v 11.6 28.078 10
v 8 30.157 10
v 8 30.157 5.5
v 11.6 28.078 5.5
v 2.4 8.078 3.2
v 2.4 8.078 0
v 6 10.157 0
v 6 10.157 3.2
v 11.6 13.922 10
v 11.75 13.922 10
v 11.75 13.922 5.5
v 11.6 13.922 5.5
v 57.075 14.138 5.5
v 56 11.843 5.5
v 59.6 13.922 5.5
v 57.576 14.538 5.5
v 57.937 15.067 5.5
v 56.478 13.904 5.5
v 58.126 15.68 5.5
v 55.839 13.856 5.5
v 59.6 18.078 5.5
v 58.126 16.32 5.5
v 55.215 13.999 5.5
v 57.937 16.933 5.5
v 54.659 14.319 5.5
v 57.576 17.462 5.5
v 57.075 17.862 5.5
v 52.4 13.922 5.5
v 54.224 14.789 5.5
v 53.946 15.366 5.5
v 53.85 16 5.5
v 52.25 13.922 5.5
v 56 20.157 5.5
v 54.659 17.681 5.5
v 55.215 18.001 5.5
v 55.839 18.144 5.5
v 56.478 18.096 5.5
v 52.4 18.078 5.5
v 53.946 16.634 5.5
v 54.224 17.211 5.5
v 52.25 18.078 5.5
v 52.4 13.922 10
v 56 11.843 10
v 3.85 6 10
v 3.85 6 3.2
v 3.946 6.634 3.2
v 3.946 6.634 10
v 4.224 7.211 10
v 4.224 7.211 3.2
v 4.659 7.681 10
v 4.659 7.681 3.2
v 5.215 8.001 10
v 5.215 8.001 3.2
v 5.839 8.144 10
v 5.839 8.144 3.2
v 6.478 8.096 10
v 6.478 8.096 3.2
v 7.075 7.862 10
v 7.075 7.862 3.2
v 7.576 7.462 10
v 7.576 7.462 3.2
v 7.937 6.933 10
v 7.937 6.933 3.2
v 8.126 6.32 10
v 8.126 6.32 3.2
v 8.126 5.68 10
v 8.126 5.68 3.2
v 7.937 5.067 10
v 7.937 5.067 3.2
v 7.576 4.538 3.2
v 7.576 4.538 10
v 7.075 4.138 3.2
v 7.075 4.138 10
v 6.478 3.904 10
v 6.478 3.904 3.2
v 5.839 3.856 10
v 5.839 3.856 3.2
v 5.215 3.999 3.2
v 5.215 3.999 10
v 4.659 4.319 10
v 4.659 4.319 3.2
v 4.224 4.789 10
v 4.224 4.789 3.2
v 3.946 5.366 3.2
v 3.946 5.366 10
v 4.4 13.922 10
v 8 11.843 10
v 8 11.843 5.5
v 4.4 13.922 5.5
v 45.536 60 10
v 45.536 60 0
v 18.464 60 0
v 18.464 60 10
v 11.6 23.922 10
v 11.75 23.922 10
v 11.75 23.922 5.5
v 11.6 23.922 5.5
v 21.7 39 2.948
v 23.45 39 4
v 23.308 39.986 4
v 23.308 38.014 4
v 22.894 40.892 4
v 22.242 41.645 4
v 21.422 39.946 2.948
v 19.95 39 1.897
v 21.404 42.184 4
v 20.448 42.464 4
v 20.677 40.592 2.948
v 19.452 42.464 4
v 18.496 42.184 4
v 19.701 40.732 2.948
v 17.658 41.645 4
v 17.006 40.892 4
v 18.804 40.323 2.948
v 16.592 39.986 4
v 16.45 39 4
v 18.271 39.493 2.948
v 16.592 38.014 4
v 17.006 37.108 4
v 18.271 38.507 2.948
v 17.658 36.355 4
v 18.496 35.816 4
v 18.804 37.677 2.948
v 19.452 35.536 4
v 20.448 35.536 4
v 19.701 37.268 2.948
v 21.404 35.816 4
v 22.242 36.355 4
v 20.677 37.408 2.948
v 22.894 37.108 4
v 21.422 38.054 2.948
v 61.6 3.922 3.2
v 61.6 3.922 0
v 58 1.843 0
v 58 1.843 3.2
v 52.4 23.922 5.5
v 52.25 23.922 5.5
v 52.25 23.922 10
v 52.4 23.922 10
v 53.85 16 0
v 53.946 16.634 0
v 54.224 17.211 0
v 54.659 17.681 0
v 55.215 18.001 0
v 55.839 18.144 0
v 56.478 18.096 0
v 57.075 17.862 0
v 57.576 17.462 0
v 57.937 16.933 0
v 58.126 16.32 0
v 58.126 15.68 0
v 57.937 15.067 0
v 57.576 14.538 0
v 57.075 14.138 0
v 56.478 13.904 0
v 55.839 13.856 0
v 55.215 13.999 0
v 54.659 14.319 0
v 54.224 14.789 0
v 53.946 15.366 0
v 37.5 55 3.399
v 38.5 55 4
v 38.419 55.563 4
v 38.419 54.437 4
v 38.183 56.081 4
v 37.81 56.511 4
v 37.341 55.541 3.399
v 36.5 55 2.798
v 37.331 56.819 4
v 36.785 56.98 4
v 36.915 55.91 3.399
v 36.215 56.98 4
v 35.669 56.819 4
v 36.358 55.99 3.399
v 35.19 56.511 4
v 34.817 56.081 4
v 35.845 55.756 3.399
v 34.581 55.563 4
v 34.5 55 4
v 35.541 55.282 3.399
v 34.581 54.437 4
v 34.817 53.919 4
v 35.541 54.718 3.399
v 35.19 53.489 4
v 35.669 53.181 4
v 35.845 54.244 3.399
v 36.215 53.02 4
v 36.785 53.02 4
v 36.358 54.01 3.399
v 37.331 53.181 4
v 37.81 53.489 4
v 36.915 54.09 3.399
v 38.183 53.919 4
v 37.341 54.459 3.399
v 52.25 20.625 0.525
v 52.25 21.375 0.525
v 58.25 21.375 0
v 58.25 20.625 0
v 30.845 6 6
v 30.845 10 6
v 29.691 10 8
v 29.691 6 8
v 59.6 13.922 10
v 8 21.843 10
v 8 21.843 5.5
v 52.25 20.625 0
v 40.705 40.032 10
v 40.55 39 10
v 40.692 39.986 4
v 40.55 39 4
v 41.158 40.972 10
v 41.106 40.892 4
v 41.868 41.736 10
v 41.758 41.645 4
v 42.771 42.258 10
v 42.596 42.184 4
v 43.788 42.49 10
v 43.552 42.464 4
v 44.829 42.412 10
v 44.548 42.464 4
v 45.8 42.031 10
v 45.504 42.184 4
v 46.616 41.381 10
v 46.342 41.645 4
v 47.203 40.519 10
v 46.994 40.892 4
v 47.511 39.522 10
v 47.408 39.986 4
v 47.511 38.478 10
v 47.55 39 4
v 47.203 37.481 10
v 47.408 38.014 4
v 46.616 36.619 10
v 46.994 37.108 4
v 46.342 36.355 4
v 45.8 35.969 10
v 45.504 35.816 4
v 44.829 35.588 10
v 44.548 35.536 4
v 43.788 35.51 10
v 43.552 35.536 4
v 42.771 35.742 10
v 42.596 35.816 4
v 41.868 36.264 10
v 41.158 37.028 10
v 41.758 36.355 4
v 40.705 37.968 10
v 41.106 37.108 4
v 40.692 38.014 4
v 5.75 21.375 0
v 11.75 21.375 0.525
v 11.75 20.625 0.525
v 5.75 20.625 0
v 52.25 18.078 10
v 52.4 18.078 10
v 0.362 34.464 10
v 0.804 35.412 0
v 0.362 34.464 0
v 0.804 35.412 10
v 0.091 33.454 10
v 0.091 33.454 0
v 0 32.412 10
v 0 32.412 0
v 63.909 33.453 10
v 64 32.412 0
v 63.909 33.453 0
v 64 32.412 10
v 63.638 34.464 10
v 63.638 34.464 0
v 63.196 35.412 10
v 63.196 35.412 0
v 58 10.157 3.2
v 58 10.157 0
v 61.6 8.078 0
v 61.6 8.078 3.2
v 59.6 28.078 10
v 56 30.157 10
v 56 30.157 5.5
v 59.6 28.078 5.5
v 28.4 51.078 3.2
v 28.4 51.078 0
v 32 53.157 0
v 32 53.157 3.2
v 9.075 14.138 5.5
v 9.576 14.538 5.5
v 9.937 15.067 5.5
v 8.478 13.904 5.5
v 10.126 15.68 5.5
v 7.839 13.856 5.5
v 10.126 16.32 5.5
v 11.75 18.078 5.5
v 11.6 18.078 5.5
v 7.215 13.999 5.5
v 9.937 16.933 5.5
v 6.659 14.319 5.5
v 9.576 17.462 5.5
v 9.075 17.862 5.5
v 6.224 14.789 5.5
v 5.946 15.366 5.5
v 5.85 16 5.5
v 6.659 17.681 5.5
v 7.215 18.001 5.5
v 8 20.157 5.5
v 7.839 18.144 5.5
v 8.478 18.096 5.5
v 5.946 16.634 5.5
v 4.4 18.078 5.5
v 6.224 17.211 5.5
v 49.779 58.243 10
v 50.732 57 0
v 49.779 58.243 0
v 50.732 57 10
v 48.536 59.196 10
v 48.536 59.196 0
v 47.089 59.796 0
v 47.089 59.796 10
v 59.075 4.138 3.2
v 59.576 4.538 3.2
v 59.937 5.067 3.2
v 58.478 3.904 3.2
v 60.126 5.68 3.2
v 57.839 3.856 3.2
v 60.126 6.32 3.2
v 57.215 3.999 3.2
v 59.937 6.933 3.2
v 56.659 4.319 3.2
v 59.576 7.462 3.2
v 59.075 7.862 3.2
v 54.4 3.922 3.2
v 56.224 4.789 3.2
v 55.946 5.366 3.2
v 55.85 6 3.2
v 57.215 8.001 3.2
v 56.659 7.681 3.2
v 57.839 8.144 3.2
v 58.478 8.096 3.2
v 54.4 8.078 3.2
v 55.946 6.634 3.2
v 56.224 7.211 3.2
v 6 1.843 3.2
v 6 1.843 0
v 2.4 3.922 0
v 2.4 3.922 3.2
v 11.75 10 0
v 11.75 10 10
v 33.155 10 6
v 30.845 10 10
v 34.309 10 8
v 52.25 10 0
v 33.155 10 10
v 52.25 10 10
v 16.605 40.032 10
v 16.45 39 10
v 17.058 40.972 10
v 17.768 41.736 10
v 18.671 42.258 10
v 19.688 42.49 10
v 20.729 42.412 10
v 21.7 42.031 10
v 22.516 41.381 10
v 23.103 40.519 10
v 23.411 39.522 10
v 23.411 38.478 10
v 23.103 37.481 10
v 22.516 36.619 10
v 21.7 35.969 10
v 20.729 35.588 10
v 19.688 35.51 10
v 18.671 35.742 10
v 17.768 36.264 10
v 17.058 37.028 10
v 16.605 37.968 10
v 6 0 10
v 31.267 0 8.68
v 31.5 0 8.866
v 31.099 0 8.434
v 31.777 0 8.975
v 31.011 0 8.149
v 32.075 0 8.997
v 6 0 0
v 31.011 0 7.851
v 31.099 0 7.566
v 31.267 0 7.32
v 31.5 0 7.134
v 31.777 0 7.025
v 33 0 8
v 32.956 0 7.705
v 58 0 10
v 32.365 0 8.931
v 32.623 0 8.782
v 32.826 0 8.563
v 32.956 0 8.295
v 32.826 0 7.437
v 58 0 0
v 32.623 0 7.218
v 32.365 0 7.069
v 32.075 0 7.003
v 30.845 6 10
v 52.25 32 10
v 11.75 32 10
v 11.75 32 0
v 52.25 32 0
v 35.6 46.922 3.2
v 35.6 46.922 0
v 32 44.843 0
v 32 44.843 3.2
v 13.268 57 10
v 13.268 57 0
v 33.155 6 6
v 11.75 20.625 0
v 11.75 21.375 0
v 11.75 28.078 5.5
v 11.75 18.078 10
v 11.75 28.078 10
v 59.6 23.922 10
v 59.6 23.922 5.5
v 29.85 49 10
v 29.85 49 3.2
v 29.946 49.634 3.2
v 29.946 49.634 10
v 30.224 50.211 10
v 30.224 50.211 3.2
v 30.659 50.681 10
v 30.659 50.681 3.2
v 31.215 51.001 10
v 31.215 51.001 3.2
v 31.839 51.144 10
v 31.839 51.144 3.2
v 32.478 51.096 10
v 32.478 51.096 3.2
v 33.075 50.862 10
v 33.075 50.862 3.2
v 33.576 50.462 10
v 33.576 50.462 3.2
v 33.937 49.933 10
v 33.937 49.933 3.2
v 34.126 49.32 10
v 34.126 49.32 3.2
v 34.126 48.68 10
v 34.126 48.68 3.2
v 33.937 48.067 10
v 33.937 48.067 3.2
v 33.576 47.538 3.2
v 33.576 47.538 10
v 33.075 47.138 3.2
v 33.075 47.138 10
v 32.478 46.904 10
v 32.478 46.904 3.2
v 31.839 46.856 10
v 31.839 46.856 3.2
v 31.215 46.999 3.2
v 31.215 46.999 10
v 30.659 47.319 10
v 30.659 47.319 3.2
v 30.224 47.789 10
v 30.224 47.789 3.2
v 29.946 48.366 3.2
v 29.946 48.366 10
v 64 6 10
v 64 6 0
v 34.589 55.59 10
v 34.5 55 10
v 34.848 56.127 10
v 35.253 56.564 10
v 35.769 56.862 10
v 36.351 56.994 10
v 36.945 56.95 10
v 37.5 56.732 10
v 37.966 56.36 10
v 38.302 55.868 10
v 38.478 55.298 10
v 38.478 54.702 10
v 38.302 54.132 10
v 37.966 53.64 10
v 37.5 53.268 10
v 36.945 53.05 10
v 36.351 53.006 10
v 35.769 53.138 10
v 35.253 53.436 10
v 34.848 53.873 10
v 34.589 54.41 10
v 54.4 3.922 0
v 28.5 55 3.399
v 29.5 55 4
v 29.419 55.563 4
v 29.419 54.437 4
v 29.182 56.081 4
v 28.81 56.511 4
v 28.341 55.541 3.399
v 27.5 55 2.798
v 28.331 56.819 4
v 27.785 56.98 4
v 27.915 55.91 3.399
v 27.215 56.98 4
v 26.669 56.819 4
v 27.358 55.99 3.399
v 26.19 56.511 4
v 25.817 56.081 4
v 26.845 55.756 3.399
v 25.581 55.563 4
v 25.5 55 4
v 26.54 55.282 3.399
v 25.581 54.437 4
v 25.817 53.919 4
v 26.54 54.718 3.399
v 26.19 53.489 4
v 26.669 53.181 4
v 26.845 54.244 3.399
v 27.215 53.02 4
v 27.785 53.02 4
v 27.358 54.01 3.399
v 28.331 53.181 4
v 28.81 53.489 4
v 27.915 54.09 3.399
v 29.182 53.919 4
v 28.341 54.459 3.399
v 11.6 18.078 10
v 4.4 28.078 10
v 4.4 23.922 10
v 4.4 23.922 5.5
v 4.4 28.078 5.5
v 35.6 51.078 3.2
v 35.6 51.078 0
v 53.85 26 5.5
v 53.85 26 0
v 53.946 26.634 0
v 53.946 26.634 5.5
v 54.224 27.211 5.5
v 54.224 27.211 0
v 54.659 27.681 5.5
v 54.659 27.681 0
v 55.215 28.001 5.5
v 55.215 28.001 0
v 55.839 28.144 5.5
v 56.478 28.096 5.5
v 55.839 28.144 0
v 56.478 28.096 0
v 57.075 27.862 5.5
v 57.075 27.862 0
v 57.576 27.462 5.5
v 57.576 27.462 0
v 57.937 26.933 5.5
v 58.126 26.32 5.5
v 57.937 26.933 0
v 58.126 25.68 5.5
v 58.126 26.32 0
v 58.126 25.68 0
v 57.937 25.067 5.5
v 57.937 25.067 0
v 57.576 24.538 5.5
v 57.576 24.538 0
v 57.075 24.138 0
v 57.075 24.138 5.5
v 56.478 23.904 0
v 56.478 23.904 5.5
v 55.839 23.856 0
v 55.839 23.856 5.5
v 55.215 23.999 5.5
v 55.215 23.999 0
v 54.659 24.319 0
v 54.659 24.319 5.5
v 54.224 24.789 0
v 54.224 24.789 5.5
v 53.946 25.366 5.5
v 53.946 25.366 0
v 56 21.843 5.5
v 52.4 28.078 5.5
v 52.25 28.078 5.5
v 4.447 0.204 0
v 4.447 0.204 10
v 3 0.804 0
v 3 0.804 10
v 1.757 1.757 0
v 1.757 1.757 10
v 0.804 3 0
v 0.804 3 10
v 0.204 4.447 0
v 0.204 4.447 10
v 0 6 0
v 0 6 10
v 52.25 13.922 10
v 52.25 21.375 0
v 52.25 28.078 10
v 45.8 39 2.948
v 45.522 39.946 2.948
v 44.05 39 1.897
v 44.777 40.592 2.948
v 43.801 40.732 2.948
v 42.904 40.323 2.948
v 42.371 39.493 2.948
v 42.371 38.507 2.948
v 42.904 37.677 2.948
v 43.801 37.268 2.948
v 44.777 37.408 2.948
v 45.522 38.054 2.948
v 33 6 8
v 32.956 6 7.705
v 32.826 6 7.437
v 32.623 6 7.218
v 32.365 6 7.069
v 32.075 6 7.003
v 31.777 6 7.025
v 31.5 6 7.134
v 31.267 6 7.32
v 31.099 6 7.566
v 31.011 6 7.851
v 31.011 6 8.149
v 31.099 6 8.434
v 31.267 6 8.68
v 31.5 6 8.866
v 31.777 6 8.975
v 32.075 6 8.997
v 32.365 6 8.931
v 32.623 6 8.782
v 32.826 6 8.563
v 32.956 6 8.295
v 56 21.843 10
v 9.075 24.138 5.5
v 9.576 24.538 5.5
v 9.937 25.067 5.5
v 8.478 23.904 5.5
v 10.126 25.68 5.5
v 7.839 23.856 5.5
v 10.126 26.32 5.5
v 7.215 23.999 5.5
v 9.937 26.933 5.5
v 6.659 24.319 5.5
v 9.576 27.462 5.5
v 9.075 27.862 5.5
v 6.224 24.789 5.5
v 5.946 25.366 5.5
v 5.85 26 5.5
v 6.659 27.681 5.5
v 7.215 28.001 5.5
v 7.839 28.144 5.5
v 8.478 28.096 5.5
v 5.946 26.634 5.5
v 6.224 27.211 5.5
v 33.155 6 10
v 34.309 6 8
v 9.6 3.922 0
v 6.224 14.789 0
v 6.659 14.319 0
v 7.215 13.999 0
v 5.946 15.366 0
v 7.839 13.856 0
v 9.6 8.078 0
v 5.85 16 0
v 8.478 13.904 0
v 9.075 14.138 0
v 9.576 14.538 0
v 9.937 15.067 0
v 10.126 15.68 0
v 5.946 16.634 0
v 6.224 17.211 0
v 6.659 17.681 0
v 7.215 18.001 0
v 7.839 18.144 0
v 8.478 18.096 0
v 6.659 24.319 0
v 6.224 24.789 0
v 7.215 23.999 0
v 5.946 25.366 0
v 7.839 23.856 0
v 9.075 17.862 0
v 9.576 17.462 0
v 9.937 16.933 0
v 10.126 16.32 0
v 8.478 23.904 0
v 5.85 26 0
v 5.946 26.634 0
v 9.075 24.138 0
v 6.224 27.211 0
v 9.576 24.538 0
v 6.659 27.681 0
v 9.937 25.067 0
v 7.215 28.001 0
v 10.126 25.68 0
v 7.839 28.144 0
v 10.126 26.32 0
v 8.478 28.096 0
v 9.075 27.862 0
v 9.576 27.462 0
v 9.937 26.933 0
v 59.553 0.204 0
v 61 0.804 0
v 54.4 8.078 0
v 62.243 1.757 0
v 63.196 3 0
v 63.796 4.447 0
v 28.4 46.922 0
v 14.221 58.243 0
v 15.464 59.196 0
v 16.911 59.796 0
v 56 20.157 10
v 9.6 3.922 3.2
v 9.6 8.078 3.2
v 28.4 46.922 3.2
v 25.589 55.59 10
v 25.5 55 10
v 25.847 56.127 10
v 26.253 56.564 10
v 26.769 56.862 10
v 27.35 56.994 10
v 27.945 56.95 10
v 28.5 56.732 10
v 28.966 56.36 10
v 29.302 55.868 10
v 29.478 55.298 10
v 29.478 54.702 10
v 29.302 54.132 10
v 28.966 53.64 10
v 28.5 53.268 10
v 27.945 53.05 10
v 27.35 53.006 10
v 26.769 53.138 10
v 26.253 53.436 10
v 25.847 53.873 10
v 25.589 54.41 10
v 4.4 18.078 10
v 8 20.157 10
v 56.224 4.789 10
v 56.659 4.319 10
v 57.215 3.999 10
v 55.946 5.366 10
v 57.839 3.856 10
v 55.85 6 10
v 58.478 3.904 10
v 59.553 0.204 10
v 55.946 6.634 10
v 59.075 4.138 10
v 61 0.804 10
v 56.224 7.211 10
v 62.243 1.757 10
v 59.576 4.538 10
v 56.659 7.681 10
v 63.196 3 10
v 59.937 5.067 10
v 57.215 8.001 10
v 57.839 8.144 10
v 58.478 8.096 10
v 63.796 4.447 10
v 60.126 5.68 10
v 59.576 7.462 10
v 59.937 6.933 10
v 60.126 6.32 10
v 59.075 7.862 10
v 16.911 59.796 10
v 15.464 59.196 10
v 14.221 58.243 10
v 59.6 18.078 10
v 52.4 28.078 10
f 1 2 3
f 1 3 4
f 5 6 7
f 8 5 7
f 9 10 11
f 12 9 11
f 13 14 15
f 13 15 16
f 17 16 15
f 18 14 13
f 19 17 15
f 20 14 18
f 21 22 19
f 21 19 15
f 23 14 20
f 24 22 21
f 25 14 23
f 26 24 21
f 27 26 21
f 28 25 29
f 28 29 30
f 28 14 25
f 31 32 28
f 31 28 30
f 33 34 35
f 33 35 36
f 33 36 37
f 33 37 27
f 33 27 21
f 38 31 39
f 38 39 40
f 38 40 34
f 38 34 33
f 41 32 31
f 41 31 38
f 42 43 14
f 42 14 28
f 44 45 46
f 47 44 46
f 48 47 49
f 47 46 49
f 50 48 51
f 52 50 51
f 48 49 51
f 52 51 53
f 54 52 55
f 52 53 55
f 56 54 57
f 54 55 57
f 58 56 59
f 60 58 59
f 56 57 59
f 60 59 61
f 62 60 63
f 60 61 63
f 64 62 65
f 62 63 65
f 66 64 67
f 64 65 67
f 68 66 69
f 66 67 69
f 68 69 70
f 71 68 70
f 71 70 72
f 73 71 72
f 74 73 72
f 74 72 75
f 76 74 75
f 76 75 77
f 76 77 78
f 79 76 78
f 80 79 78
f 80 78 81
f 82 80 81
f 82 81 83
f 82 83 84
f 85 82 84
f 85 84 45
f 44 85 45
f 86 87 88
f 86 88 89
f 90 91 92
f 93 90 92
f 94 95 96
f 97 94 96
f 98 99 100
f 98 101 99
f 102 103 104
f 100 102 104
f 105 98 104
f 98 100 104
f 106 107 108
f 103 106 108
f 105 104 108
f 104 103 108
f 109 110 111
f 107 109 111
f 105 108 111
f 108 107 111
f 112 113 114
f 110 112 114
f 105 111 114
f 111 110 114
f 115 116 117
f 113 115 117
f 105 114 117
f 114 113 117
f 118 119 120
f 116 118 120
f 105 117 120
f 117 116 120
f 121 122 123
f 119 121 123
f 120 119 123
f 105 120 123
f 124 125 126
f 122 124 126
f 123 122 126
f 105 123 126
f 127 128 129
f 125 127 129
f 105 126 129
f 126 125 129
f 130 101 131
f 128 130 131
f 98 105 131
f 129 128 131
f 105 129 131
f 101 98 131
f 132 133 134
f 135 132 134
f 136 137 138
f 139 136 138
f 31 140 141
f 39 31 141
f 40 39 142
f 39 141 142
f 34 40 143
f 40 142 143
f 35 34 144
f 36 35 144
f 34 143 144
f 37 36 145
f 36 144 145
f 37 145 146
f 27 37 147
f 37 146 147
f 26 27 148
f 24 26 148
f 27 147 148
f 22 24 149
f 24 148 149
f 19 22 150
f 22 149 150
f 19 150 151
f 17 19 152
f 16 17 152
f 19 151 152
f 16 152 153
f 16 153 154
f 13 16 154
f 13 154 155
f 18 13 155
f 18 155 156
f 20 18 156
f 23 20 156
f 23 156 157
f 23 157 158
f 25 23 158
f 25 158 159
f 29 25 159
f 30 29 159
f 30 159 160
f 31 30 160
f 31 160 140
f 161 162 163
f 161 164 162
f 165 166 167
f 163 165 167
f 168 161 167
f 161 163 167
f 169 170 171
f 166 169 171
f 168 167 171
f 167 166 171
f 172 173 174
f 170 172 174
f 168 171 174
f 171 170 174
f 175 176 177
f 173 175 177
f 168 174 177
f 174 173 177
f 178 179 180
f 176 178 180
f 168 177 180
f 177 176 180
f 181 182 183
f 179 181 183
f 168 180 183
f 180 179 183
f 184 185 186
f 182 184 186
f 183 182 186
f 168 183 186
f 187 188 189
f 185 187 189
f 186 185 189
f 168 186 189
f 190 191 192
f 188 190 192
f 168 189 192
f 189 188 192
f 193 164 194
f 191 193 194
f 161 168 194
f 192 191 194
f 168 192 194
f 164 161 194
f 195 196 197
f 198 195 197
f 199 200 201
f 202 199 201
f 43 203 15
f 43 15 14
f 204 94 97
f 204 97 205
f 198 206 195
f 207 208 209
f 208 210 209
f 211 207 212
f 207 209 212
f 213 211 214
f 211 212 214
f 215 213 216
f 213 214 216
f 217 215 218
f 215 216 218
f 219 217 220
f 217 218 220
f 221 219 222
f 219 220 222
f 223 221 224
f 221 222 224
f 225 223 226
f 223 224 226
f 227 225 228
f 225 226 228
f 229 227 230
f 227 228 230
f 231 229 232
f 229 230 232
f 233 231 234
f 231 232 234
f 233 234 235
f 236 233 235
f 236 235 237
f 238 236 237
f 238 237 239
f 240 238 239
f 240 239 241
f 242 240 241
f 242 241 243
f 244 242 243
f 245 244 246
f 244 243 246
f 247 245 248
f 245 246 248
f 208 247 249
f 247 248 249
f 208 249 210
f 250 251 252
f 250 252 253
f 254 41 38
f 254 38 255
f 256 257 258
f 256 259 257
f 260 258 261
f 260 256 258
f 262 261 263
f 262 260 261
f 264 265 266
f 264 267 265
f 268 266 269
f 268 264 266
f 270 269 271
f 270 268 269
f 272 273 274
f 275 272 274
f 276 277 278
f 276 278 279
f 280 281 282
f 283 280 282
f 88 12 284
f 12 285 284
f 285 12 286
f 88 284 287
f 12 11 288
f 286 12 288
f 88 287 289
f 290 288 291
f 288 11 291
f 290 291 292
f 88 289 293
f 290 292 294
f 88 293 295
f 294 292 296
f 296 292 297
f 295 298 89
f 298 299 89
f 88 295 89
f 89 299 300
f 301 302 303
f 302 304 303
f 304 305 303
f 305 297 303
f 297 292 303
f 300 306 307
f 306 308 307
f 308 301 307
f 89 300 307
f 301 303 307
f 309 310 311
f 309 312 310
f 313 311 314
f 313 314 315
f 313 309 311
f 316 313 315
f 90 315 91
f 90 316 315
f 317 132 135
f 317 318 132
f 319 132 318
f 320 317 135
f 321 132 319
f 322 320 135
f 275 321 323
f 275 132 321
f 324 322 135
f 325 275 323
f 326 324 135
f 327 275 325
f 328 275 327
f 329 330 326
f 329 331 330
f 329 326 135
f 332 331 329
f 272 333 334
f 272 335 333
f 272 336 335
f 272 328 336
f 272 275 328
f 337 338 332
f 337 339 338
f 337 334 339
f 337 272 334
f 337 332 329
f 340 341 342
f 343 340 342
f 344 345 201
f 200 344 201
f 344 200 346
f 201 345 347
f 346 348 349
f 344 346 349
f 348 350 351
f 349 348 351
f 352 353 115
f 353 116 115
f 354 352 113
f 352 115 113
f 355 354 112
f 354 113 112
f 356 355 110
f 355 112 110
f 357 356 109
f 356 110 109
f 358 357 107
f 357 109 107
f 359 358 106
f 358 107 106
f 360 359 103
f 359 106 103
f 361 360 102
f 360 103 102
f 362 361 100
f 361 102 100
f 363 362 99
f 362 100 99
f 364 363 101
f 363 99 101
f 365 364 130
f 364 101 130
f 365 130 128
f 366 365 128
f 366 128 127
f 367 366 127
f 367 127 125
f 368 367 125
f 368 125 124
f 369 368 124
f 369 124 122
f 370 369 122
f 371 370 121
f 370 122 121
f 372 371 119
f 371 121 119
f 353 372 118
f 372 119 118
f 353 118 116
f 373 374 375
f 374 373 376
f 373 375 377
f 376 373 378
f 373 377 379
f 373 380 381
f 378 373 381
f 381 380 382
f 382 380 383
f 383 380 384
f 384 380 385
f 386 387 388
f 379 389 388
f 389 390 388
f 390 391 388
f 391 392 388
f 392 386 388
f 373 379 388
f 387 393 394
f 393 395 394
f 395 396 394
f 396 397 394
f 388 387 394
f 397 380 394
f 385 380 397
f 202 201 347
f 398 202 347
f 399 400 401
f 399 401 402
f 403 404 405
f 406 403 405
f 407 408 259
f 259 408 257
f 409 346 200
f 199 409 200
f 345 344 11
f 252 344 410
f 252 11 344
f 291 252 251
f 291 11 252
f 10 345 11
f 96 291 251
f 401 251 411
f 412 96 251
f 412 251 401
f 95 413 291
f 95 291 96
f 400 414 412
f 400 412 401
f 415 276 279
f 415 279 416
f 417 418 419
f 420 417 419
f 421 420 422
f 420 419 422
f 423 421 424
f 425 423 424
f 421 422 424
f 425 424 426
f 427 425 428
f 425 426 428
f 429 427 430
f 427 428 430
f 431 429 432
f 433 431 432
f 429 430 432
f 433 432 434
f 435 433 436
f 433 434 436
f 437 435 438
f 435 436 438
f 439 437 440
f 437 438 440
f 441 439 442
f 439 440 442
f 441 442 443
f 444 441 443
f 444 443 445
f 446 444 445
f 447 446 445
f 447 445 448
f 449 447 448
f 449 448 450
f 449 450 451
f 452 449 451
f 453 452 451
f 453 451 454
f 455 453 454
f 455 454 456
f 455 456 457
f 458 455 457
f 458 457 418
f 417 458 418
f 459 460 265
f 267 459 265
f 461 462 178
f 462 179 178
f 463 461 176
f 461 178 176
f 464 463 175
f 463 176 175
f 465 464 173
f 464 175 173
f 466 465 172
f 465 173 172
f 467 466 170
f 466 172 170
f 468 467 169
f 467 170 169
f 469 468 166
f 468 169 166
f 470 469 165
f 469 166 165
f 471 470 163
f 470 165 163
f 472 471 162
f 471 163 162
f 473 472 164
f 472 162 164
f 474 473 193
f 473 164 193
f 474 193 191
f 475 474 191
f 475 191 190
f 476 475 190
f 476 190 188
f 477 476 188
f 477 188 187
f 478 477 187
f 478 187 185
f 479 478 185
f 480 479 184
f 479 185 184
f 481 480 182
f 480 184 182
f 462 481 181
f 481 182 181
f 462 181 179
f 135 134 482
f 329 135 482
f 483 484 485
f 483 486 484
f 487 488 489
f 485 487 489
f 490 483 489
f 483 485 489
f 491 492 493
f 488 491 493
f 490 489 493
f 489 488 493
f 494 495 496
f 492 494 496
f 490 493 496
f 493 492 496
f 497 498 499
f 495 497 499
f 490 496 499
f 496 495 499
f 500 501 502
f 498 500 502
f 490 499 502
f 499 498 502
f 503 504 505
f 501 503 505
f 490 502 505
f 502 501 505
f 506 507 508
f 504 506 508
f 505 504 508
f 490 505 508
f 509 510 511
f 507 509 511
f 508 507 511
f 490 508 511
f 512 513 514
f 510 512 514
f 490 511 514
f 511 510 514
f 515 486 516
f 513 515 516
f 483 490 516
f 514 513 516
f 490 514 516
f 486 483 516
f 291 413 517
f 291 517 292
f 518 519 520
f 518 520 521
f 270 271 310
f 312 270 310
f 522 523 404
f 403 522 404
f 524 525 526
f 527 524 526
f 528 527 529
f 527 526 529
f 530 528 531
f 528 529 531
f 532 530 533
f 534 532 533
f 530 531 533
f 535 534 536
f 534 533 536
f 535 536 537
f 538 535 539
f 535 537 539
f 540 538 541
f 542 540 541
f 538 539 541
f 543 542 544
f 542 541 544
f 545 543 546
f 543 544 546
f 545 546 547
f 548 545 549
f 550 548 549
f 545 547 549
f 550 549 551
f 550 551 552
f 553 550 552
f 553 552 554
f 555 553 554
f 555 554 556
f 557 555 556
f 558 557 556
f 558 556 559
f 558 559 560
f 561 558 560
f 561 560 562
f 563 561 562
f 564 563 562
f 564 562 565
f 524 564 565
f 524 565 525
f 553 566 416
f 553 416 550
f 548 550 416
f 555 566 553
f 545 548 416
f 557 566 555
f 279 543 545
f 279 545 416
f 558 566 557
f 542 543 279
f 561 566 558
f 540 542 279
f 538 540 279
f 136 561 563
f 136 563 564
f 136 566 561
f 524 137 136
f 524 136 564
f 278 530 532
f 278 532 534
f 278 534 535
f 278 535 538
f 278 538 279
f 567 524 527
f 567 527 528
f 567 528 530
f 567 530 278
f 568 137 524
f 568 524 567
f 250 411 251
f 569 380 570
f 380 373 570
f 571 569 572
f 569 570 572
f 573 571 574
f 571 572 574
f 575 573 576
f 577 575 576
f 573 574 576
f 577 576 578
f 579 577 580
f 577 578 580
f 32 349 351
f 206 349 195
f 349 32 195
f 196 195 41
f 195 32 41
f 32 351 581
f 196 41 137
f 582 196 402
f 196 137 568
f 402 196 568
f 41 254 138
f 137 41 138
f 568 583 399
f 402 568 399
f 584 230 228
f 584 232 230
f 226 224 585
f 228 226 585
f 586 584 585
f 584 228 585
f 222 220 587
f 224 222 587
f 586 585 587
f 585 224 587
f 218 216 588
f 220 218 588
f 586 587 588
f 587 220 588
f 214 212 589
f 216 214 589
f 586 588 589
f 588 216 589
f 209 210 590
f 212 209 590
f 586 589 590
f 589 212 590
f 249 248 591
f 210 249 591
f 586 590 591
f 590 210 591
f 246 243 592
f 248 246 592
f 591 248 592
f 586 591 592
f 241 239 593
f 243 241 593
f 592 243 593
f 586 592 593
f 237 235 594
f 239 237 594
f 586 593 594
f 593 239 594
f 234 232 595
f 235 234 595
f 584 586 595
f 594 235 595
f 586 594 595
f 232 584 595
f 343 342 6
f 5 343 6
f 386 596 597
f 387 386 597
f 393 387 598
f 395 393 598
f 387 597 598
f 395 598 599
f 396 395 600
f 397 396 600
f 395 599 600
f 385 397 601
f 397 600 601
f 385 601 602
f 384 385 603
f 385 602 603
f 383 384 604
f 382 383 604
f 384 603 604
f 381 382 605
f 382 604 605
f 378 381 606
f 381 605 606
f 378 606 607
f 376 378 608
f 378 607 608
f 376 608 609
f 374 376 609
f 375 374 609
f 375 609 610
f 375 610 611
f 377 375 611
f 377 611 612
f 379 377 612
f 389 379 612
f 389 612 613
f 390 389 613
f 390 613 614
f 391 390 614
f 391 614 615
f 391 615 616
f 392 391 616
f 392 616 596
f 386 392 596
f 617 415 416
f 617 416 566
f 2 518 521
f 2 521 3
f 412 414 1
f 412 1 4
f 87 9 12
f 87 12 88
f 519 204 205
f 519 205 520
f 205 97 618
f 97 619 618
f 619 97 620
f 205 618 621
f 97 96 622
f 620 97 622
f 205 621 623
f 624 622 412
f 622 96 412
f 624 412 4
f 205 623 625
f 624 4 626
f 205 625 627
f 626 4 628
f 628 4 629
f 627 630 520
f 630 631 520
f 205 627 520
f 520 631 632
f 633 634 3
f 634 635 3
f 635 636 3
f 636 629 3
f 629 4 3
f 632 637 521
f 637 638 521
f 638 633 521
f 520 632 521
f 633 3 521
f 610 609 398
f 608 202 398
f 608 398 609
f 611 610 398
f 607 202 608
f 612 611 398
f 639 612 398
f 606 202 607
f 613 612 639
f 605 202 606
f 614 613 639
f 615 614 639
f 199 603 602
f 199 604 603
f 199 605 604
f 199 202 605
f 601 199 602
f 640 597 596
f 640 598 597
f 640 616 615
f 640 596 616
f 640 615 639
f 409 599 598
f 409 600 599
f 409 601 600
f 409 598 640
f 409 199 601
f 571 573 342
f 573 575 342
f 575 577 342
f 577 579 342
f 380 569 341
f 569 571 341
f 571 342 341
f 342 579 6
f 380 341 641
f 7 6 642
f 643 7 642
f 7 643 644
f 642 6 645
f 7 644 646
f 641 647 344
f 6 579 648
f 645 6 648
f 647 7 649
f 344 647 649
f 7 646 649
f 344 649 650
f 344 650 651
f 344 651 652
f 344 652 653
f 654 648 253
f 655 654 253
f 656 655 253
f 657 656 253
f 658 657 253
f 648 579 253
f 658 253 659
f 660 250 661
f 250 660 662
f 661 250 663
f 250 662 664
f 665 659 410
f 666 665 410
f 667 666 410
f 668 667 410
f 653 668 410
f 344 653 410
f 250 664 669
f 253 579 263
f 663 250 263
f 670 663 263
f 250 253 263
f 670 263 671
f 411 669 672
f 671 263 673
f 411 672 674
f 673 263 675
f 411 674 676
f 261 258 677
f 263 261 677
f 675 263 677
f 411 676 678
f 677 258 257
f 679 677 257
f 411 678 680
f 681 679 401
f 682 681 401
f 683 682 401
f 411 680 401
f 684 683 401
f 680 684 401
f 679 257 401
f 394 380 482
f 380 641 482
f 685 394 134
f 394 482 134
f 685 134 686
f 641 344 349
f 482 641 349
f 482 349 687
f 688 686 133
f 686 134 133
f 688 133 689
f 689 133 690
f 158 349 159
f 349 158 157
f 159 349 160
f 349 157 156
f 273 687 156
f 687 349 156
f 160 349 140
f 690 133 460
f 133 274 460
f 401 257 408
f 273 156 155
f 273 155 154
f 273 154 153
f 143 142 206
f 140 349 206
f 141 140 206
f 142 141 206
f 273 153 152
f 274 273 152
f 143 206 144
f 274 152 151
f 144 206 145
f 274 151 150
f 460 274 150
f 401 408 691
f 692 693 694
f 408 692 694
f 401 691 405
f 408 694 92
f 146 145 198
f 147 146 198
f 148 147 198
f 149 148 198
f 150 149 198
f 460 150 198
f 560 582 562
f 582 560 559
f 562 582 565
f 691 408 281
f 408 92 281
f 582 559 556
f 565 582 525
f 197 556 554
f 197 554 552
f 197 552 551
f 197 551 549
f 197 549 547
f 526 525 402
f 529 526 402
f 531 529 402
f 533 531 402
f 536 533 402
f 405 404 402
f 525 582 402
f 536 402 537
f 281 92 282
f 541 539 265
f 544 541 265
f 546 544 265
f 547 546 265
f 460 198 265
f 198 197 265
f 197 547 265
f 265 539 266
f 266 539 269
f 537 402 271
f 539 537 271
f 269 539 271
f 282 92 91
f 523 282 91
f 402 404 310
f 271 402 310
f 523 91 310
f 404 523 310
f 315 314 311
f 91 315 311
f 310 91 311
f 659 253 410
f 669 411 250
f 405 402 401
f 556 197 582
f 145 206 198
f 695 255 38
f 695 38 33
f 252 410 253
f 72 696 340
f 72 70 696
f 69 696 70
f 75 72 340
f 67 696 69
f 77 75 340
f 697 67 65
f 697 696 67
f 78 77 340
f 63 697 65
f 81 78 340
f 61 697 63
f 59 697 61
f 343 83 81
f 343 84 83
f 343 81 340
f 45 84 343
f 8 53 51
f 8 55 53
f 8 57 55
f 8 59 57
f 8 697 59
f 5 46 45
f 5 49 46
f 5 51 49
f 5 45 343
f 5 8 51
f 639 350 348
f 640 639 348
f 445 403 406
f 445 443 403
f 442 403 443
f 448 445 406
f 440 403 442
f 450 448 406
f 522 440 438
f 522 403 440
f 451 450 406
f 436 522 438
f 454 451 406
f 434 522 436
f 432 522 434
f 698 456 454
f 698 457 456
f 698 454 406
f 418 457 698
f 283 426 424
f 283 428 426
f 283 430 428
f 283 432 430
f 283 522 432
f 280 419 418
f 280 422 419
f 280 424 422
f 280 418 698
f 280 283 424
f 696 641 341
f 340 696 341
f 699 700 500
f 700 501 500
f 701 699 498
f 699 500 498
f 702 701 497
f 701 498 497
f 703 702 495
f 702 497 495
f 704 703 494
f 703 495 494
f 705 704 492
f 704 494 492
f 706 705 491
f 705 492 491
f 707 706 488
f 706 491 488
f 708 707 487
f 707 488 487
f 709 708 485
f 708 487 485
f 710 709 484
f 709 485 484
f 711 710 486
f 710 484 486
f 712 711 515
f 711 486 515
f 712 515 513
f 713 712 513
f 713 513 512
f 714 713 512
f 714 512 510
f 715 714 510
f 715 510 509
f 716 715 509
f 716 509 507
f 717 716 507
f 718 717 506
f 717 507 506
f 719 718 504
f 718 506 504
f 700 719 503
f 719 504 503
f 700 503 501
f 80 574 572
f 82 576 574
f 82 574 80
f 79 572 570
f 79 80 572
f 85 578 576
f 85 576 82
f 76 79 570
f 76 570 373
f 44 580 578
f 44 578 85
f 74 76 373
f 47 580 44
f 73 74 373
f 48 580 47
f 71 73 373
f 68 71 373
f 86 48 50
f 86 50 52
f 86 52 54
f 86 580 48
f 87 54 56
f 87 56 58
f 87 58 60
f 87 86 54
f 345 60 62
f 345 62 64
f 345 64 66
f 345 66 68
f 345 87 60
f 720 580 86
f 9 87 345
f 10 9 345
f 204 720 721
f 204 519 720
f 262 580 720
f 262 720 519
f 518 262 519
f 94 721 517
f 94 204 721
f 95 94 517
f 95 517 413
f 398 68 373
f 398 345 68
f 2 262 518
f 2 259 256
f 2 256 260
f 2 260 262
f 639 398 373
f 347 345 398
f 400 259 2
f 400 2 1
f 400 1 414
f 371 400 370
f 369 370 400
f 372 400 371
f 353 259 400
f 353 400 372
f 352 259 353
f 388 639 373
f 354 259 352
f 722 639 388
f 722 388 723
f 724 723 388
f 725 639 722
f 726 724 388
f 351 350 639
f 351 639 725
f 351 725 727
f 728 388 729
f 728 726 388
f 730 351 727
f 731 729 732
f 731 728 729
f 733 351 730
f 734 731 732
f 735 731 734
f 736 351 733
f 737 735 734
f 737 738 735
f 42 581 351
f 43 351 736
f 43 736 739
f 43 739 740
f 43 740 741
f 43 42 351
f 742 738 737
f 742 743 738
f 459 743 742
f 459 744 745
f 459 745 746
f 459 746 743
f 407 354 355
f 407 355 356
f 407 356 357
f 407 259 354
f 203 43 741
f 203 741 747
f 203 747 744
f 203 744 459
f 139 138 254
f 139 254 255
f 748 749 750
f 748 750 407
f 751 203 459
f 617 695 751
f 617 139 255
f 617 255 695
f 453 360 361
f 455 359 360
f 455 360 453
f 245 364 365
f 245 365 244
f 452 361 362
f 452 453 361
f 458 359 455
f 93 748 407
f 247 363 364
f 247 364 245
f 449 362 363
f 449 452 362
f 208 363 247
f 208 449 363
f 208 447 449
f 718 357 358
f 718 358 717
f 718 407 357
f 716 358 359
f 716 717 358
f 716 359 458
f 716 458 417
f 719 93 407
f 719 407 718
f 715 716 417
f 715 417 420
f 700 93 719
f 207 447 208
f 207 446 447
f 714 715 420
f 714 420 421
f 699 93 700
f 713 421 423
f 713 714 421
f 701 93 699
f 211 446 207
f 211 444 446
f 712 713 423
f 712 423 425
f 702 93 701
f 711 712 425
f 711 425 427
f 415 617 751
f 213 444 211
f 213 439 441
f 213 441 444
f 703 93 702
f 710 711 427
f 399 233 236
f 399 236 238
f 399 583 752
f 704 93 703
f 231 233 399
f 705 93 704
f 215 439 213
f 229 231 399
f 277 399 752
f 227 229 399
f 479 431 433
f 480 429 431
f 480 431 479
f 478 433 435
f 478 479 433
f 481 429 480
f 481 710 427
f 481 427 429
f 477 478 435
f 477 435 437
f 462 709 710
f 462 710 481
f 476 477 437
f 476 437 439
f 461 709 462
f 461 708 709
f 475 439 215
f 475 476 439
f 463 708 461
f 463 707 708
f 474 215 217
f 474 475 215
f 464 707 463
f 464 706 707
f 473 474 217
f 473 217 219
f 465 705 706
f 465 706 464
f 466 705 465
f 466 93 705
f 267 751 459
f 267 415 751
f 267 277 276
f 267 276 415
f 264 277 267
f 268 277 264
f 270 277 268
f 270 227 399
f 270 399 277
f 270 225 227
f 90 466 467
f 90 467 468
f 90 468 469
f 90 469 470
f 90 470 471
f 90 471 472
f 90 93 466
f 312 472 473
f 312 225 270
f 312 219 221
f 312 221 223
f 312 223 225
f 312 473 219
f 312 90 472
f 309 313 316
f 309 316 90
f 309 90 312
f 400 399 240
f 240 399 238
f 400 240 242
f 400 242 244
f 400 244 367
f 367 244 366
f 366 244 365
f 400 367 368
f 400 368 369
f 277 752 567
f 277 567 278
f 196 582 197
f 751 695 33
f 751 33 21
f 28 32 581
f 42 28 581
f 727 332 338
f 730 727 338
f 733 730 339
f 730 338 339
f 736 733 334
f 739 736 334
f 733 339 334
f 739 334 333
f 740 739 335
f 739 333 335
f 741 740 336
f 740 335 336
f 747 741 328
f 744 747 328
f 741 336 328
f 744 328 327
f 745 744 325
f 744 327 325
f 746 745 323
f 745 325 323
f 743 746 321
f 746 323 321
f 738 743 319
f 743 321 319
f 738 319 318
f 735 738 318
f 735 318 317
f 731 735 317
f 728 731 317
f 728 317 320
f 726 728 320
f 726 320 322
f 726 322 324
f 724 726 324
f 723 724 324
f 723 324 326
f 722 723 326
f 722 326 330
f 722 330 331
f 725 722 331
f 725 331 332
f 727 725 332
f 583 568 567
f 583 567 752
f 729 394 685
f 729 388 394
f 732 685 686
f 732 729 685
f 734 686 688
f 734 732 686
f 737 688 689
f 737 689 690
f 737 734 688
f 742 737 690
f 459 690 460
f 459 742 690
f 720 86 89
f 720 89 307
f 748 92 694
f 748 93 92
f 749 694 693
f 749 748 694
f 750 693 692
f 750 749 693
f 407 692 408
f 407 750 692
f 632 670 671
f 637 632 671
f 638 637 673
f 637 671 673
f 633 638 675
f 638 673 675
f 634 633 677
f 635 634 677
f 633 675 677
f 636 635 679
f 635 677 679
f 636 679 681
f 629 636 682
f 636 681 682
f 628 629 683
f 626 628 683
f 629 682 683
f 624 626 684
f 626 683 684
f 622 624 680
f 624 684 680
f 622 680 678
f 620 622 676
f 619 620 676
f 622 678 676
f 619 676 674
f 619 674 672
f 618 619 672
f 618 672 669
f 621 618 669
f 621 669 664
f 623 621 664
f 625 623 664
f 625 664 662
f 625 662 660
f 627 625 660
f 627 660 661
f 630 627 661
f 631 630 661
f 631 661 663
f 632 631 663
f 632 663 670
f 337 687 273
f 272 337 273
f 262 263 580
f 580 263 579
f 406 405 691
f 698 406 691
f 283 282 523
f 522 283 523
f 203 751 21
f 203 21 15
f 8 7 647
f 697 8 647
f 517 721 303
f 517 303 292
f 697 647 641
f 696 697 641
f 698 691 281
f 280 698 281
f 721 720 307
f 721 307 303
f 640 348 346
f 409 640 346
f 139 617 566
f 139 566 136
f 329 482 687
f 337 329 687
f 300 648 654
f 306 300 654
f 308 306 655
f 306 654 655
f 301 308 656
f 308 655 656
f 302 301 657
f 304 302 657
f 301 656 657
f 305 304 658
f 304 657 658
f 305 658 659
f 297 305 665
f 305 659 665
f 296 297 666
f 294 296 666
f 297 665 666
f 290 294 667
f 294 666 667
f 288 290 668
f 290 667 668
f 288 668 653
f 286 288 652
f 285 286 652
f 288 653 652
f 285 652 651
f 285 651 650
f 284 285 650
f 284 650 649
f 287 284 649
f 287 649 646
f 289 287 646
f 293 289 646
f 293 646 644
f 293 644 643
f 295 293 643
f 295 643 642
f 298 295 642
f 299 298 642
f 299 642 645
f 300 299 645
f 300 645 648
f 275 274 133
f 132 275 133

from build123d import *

# Parameters (mm, degrees)
EXTRUDE_1_DEPTH           = 10
FILLET_1_R                = 6
SKETCH_2_W                = 40.5
SKETCH_2_H                = 22
CUT_EXTRUDE_1_DEPTH       = 11
HOLE_WIZARD_4_0_1_D       = 4
HOLE_WIZARD_4_0_1_DEPTH   = 6
HOLE_WIZARD_4_0_1_TIP     = 1.201721238
HOLE_WIZARD_7_0_7_1_D     = 7
HOLE_WIZARD_7_0_7_1_DEPTH = 6
HOLE_WIZARD_7_0_7_1_TIP   = 2.103012167
HOLE_WIZARD_M41_D         = 4.3
CUT_EXTRUDE_4_DEPTH       = 4.5
HOLE_WIZARD_M42_D         = 4.3
CUT_EXTRUDE_7_DEPTH       = 3.2
SKETCH_19_W               = 4.5
SKETCH_19_H               = 4.156921938
CUT_EXTRUDE_13_DEPTH      = 0.15
SKETCH_21_W               = 4.5
SKETCH_21_H               = 4.156921938
CUT_EXTRUDE_14_DEPTH      = 0.15
SKETCH_22_W               = 4.5
SKETCH_22_H               = 4.156921938
CUT_EXTRUDE_15_DEPTH      = 0.15
SKETCH_23_W               = 4.5
SKETCH_23_H               = 4.156921938
CUT_EXTRUDE_16_DEPTH      = 0.15
CUT_EXTRUDE_17_DEPTH      = 4
HOLE_WIZARD_M2_21_D       = 2
HOLE_WIZARD_M2_21_DEPTH   = 10
HOLE_WIZARD_M2_21_TIP     = 0.600860619
CUT_EXTRUDE_19_DEPTH      = 0.375
CUT_EXTRUDE_20_DEPTH      = 0.375


with BuildPart() as part:
    # Эскиз1 → Бобышка-Вытянуть1 (new body)
    with BuildSketch(Plane.XY):
        Polygon((0, 0), (64, 0), (64, 34.019237886), (49, 60), (15, 60), (0, 34.02), align=None)
    extrude(amount=EXTRUDE_1_DEPTH)

    # Скругление1
    fillet_1_edges = [part.edges().sort_by_distance(p)[0] for p in [
        (0, 34.02, 5),
        (15, 60, 5),
        (49, 60, 5),
        (64, 34.019237886, 5),
        (64, 0, 5),
        (0, 0, 5),
    ]]
    fillet(fillet_1_edges, radius=FILLET_1_R)

    # Эскиз2 → Вырез-Вытянуть1 (cut, through all)
    with BuildSketch(Plane.XY.offset(10)):
        with Locations((32, 21)):
            Rectangle(SKETCH_2_W, SKETCH_2_H)
    extrude(amount=-CUT_EXTRUDE_1_DEPTH, mode=Mode.SUBTRACT)

    # Отверстия под штифты Ø4.0 мм1
    with Locations(Plane.XY.offset(10)):
        with Locations((27.499949191, 55), (36.5, 55)):
            Hole(HOLE_WIZARD_4_0_1_D / 2, depth=HOLE_WIZARD_4_0_1_DEPTH)
            with Locations((0, 0, -(HOLE_WIZARD_4_0_1_DEPTH + HOLE_WIZARD_4_0_1_TIP / 2))):  # 118° drill point
                Cone(0, HOLE_WIZARD_4_0_1_D / 2, HOLE_WIZARD_4_0_1_TIP, mode=Mode.SUBTRACT)

    # Диаметр отверстия Ø7.0 (7)1
    with Locations(Plane.XY.offset(10)):
        with Locations((19.949949191, 39), (44.05, 39)):
            Hole(HOLE_WIZARD_7_0_7_1_D / 2, depth=HOLE_WIZARD_7_0_7_1_DEPTH)
            with Locations((0, 0, -(HOLE_WIZARD_7_0_7_1_DEPTH + HOLE_WIZARD_7_0_7_1_TIP / 2))):  # 118° drill point
                Cone(0, HOLE_WIZARD_7_0_7_1_D / 2, HOLE_WIZARD_7_0_7_1_TIP, mode=Mode.SUBTRACT)

    # Сверло под метчик  спиральное M41 (through all)
    with Locations(Plane.XY.offset(10)):
        with Locations((56, 26), (56, 16), (8, 26), (8, 16)):
            Hole(HOLE_WIZARD_M41_D / 2)

    # Эскиз9 → Вырез-Вытянуть4 (cut)
    with BuildSketch(Plane(origin=(0, 0, 10), x_dir=(-1, 0, 0), z_dir=(0, 0, -1))):
        Polygon((-56, 30.156921938), (-59.6, 28.078460969), (-59.6, 23.921539031), (-56, 21.843078062), (-52.4, 23.921539031), (-52.4, 28.078460969), align=None)
        Polygon((-56, 20.156921938), (-59.6, 18.078460969), (-59.6, 13.921539031), (-56, 11.843078062), (-52.4, 13.921539031), (-52.4, 18.078460969), align=None)
        Polygon((-8, 30.156921938), (-11.6, 28.078460969), (-11.6, 23.921539031), (-8, 21.843078062), (-4.4, 23.921539031), (-4.4, 28.078460969), align=None)
        Polygon((-8, 20.156921938), (-11.6, 18.078460969), (-11.6, 13.921539031), (-8, 11.843078062), (-4.4, 13.921539031), (-4.4, 18.078460969), align=None)
    extrude(amount=CUT_EXTRUDE_4_DEPTH, mode=Mode.SUBTRACT)

    # Сверло под метчик  спиральное M42 (through all)
    with Locations(Plane.XY.offset(10)):
        with Locations((32, 49), (6, 6), (58, 6)):
            Hole(HOLE_WIZARD_M42_D / 2)

    # Эскиз18 → Вырез-Вытянуть7 (cut)
    with BuildSketch(Plane(origin=(0, 0, 0), x_dir=(-1, 0, 0), z_dir=(0, 0, -1))):
        Polygon((-32, 53.156921938), (-35.6, 51.078460969), (-35.6, 46.921539031), (-32, 44.843078062), (-28.4, 46.921539031), (-28.4, 51.078460969), align=None)
        Polygon((-58, 10.156921938), (-61.6, 8.078460969), (-61.6, 3.921539031), (-58, 1.843078062), (-54.4, 3.921539031), (-54.4, 8.078460969), align=None)
        Polygon((-6, 10.156921938), (-9.6, 8.078460969), (-9.6, 3.921539031), (-6, 1.843078062), (-2.4, 3.921539031), (-2.4, 8.078460969), align=None)
    extrude(amount=-CUT_EXTRUDE_7_DEPTH, mode=Mode.SUBTRACT)

    # Эскиз19 → Вырез-Вытянуть13 (cut)
    with BuildSketch(Plane.ZY.offset(-52.25)):
        with Locations((7.75, 26)):
            Rectangle(SKETCH_19_W, SKETCH_19_H)
    extrude(amount=-CUT_EXTRUDE_13_DEPTH, mode=Mode.SUBTRACT)

    # Эскиз21 → Вырез-Вытянуть14 (cut)
    with BuildSketch(Plane(origin=(11.75, 0, 0), x_dir=(0, 0, -1), z_dir=(1, 0, 0))):
        with Locations((-7.75, 26)):
            Rectangle(SKETCH_21_W, SKETCH_21_H)
    extrude(amount=-CUT_EXTRUDE_14_DEPTH, mode=Mode.SUBTRACT)

    # Эскиз22 → Вырез-Вытянуть15 (cut)
    with BuildSketch(Plane.ZY.offset(-52.25)):
        with Locations((7.75, 16)):
            Rectangle(SKETCH_22_W, SKETCH_22_H)
    extrude(amount=-CUT_EXTRUDE_15_DEPTH, mode=Mode.SUBTRACT)

    # Эскиз23 → Вырез-Вытянуть16 (cut)
    with BuildSketch(Plane(origin=(11.75, 0, 0), x_dir=(0, 0, -1), z_dir=(1, 0, 0))):
        with Locations((-7.75, 16)):
            Rectangle(SKETCH_23_W, SKETCH_23_H)
    extrude(amount=-CUT_EXTRUDE_16_DEPTH, mode=Mode.SUBTRACT)

    # Эскиз12 → Вырез-Вытянуть17 (cut)
    with BuildSketch(Plane(origin=(0, 10, 0), x_dir=(1, 0, 0), z_dir=(0, 1, 0))):
        Polygon((34.309375673, -8), (33.154675134, -6), (30.845274057, -6), (29.690573519, -8), (30.845274057, -10), (33.154675134, -10), align=None)
    extrude(amount=-CUT_EXTRUDE_17_DEPTH, mode=Mode.SUBTRACT)

    # Сверло под метчик  спиральное M2.21
    with Locations(Plane(origin=(0, 0, 0), x_dir=(-1, 0, 0), z_dir=(0, -1, 0))):
        with Locations((-32, -8)):
            Hole(HOLE_WIZARD_M2_21_D / 2, depth=HOLE_WIZARD_M2_21_DEPTH)
            with Locations((0, 0, -(HOLE_WIZARD_M2_21_DEPTH + HOLE_WIZARD_M2_21_TIP / 2))):  # 118° drill point
                Cone(0, HOLE_WIZARD_M2_21_D / 2, HOLE_WIZARD_M2_21_TIP, mode=Mode.SUBTRACT)

    # Эскиз29 → Вырез-Вытянуть19 (cut, symmetric)
    with BuildSketch(Plane(origin=(0, 21, 0), x_dir=(1, 0, 0), z_dir=(0, 1, 0))):
        Polygon((5.75, 0), (12.75, 0), (12.75, -0.612420645), align=None)
    extrude(amount=CUT_EXTRUDE_19_DEPTH, both=True, mode=Mode.SUBTRACT)

    # Эскиз29<3> → Вырез-Вытянуть20 (cut, symmetric)
    with BuildSketch(Plane(origin=(0, 21, 0), x_dir=(1, 0, 0), z_dir=(0, 1, 0))):
        Polygon((51.25, 0), (51.25, -0.612420645), (58.25, 0), align=None)
    extrude(amount=CUT_EXTRUDE_20_DEPTH, both=True, mode=Mode.SUBTRACT)


solid = part.part
